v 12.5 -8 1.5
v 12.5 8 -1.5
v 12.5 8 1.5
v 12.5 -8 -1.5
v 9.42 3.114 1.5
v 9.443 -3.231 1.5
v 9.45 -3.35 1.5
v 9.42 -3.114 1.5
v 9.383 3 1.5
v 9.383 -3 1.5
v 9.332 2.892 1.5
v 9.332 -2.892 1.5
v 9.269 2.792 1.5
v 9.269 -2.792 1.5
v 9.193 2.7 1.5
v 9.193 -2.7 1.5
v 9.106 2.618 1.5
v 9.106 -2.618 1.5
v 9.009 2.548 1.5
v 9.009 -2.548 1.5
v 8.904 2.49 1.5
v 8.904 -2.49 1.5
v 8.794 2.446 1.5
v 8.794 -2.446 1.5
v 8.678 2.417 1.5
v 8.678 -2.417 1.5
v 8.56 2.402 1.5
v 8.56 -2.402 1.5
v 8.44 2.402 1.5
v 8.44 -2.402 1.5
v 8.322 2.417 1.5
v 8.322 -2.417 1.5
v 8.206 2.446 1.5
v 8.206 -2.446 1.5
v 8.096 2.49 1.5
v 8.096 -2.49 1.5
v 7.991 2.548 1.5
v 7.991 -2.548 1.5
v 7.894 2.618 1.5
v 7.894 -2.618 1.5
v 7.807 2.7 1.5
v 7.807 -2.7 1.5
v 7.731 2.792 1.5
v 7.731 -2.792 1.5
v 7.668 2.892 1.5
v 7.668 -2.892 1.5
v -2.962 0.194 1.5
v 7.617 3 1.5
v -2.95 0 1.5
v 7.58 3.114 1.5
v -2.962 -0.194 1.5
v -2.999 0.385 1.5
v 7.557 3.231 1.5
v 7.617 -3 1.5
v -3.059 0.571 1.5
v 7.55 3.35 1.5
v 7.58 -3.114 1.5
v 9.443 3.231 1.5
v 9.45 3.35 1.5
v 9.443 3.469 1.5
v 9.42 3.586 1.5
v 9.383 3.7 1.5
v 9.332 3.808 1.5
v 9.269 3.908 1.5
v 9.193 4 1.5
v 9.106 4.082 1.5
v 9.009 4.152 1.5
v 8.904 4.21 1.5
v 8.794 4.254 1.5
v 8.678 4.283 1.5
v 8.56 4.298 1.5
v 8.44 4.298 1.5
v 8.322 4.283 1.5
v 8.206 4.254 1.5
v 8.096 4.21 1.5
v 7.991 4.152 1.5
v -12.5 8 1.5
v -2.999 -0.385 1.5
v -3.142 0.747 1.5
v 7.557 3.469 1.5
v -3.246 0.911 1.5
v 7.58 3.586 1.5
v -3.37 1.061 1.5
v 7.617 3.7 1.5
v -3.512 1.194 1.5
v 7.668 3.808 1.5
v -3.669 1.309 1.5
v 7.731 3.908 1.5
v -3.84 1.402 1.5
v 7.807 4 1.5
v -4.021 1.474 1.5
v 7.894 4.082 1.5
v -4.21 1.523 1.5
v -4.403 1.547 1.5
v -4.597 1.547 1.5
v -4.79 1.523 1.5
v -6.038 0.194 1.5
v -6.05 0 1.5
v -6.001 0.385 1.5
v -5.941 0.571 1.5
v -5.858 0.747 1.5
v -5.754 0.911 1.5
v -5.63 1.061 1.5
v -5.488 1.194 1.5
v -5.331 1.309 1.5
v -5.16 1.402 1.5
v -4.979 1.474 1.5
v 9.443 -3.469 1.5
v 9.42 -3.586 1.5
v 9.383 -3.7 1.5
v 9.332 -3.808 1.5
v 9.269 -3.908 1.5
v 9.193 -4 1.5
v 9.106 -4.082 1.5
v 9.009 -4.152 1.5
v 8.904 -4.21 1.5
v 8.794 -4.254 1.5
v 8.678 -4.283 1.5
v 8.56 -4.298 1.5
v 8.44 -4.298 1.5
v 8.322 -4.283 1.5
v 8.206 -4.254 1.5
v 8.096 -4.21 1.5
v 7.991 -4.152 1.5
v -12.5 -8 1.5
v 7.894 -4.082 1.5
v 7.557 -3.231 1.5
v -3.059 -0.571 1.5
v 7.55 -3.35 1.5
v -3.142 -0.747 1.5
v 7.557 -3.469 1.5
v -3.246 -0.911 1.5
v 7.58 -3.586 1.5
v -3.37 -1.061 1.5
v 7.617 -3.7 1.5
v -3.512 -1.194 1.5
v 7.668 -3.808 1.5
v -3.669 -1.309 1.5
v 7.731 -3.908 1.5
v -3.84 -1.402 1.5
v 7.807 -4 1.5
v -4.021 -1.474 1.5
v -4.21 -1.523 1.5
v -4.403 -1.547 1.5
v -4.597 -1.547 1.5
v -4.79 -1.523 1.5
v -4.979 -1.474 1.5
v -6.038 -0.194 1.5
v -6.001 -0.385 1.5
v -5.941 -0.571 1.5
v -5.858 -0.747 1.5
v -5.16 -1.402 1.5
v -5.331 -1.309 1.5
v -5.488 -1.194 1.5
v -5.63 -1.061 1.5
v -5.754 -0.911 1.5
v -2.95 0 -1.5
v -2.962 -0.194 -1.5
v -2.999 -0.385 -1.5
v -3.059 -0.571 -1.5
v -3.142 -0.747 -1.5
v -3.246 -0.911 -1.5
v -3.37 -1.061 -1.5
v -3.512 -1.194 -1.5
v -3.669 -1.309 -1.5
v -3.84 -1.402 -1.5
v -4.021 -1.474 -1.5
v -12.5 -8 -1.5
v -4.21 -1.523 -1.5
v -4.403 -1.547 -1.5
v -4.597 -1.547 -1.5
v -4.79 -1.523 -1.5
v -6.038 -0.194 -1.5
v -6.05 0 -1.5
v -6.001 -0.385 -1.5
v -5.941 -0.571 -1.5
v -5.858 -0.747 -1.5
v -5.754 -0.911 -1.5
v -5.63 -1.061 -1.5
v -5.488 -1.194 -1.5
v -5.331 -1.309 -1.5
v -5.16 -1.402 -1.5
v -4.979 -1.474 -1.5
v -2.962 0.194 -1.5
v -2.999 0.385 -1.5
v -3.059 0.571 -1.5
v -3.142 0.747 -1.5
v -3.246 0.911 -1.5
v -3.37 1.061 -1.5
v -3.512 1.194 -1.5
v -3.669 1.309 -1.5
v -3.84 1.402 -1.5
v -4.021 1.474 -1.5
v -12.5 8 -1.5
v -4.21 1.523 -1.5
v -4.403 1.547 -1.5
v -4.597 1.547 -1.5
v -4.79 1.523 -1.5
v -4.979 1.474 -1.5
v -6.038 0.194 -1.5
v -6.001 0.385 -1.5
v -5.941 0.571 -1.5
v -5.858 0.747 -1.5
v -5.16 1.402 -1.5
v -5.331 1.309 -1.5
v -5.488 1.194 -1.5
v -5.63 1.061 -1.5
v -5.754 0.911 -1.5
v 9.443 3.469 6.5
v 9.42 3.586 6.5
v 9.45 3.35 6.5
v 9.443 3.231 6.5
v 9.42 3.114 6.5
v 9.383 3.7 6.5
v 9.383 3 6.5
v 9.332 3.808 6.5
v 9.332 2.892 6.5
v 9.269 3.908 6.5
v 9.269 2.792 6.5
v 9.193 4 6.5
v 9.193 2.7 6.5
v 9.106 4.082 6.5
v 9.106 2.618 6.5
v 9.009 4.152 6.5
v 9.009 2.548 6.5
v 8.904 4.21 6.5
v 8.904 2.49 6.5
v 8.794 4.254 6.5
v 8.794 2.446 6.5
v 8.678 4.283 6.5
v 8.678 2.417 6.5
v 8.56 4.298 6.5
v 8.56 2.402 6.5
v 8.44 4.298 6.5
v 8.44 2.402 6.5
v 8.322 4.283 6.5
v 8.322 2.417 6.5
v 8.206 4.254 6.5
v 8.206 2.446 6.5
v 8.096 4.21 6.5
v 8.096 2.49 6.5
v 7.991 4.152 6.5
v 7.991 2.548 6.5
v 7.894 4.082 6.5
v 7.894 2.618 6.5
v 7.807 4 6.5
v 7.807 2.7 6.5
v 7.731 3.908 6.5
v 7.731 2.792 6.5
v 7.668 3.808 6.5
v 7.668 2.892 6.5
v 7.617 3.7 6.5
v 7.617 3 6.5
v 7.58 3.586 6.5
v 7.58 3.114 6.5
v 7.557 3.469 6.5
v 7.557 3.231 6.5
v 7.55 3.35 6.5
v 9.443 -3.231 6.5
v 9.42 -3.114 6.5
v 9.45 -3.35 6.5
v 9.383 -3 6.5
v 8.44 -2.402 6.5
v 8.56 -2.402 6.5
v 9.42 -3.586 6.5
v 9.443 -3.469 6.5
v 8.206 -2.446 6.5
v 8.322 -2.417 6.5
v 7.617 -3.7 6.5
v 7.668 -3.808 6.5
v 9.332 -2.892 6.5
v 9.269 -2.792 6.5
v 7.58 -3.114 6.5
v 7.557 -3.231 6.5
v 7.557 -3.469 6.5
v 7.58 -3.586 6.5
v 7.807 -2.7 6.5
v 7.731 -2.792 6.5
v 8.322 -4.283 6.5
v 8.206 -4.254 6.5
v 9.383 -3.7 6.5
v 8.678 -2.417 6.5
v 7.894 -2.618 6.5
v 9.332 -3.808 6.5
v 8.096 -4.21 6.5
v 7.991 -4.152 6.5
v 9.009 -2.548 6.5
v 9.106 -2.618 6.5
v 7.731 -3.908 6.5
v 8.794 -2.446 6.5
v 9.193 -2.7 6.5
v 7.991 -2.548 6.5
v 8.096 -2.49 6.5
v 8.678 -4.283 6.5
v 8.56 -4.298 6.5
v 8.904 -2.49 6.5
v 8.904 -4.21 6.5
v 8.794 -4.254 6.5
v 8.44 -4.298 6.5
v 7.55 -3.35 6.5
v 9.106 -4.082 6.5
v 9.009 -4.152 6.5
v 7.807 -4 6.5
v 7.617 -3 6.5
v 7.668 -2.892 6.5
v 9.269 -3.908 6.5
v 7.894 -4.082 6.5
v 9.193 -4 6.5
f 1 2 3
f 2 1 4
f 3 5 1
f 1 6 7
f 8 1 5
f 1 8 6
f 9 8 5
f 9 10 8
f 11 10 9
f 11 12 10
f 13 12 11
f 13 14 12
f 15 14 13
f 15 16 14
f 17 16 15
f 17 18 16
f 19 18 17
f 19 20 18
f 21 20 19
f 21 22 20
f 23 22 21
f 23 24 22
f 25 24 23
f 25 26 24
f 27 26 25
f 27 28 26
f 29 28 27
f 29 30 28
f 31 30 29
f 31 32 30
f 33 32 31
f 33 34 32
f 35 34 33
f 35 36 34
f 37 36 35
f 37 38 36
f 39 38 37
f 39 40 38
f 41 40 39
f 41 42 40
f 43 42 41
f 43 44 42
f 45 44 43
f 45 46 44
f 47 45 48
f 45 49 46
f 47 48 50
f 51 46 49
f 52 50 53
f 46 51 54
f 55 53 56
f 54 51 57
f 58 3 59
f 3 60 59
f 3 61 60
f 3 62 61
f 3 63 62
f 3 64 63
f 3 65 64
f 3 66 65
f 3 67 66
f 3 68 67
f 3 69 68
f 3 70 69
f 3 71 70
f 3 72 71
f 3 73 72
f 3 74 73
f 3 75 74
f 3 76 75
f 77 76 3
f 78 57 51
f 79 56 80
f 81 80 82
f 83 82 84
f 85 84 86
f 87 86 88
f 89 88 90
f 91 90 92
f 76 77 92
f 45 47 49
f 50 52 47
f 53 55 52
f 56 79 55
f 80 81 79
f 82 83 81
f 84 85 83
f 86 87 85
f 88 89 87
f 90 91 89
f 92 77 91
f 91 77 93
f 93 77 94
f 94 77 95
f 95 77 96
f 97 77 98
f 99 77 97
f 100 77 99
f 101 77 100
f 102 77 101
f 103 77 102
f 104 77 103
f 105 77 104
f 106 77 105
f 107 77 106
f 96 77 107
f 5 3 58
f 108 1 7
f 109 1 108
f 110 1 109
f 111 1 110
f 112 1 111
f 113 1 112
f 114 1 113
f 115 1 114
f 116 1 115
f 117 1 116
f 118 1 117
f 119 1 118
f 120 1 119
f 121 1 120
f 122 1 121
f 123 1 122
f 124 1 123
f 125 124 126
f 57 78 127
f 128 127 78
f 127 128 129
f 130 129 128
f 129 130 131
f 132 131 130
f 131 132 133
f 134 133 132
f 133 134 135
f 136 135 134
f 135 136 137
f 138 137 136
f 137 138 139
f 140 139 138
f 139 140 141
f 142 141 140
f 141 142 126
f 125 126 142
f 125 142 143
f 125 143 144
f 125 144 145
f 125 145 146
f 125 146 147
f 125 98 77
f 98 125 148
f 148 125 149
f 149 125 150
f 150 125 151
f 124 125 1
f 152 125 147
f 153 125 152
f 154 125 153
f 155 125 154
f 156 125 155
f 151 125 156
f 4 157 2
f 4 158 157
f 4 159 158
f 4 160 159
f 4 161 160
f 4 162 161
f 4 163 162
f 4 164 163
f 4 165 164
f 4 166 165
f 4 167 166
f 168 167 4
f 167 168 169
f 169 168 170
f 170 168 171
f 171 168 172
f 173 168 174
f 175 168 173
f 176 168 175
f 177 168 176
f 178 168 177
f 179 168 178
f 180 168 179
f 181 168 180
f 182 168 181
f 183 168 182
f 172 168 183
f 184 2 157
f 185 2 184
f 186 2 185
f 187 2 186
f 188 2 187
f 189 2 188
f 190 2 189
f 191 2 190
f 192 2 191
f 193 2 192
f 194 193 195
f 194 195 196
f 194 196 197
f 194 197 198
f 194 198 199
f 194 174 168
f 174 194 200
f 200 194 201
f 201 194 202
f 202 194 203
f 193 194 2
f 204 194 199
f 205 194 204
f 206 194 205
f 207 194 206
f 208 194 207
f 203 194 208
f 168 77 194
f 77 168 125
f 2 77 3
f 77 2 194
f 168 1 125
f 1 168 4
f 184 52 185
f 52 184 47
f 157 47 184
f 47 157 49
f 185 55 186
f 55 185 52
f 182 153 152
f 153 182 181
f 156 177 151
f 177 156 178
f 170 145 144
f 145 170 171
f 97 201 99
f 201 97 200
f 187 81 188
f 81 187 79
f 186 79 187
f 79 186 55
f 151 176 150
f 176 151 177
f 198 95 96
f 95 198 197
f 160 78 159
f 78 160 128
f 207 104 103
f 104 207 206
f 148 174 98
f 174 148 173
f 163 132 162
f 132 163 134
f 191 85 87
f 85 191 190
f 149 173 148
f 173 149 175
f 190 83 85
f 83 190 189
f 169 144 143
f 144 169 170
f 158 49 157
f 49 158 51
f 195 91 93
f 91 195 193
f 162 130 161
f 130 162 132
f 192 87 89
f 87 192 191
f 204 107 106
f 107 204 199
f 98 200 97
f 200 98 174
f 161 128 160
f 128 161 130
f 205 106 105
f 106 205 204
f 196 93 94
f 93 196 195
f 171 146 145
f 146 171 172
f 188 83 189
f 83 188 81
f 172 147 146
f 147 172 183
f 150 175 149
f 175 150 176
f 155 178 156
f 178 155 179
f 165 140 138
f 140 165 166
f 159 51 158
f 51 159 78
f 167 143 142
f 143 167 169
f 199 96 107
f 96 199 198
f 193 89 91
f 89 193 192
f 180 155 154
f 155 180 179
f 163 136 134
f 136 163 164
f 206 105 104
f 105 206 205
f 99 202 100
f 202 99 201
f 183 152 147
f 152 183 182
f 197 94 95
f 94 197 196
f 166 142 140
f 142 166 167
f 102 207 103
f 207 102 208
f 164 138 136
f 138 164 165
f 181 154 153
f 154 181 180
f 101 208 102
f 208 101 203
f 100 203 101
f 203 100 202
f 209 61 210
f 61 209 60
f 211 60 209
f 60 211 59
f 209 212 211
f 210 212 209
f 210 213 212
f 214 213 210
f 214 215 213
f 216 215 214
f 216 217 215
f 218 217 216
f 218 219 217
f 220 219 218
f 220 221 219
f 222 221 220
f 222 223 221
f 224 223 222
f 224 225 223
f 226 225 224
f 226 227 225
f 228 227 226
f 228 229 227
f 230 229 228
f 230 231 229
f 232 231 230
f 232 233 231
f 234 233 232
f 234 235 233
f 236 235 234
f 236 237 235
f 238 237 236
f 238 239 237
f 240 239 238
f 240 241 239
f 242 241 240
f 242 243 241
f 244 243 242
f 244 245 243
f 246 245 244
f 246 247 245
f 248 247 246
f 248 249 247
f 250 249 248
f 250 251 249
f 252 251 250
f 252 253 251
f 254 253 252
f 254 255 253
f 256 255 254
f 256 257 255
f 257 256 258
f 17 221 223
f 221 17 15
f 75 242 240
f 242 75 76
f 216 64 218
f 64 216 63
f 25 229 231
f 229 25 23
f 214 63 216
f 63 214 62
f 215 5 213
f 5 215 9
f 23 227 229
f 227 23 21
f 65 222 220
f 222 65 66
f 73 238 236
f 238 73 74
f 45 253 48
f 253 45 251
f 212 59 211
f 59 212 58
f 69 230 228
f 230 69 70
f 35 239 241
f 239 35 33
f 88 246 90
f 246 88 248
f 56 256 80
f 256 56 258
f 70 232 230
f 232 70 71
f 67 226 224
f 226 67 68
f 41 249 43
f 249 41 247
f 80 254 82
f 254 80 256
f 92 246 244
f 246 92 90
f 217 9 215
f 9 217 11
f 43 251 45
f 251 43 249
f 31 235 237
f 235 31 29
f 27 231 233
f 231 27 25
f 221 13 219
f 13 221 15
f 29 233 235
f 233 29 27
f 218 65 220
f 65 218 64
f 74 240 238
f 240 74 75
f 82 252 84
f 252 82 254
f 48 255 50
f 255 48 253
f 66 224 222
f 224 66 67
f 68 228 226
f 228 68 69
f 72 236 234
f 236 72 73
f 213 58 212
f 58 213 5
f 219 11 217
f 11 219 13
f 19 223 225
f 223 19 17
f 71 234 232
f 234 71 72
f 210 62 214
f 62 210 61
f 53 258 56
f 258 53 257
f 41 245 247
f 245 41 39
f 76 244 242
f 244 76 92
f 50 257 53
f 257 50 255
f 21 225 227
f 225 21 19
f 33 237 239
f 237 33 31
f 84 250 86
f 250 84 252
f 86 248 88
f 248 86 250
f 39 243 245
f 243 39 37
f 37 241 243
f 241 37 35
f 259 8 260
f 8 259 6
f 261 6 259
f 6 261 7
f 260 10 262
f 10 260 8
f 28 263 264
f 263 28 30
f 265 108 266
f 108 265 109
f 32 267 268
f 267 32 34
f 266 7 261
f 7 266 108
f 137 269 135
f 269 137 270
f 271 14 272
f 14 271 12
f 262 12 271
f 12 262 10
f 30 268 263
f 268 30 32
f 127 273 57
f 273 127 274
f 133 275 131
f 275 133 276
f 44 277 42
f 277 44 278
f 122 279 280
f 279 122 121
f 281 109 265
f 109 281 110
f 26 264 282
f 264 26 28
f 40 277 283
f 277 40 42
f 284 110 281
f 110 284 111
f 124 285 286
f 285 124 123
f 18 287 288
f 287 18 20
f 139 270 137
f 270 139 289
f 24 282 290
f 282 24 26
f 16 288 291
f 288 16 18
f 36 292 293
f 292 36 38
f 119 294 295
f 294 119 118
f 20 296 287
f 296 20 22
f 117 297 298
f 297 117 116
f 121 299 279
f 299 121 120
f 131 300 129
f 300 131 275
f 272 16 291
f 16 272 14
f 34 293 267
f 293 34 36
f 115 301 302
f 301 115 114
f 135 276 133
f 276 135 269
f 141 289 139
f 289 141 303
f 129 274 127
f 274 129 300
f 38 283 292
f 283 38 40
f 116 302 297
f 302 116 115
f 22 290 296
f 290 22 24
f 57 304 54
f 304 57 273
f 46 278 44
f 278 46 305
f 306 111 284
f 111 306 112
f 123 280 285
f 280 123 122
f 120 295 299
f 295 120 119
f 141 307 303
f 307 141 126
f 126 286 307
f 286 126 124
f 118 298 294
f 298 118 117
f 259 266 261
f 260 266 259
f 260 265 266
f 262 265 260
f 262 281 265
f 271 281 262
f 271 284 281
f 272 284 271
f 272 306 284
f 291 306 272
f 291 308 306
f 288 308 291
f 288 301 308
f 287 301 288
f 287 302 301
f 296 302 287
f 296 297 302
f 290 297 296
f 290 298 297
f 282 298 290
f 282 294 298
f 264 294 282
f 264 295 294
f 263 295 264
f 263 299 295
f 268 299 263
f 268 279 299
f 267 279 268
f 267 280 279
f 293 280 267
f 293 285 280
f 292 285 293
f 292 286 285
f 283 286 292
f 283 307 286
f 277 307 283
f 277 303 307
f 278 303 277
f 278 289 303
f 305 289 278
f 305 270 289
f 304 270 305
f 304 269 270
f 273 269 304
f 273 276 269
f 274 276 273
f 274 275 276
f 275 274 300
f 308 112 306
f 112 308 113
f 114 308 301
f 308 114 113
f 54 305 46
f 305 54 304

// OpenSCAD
x = 15;
y = 15;
h = 3;
dTrou = 1.9;
dxTrou = 8.6;

//attacheHoriz(15,15,3,1.9);

//translate([0,2*y,0]) 
attacheVert(25,16,3,1.9);

module attacheVert(x,y,z,dTrou) {
union() {
    difference() {
        cube([x,y,h], true);
        #translate([-0.5*x+8,0,0]) cylinder(h=h*2,d=3.1, $fn=50, center=true);
        
    }
    translate([x*0.5-4,0.5*(dxTrou-dTrou),h/2])
    cylinder(h=5,d=dTrou, $fn=50);
    translate([x*0.5-4,-0.5*(dxTrou-dTrou),h/2]) 
    cylinder(h=5, d=dTrou, $fn=50);
}
}

module attacheHoriz(x,y,z,dTrou) {
union() {
    difference() {
        cube([x,y,h], true);
        #cylinder(h=h*2,d=3.1, $fn=50, center=true);
        
    }
    translate([x*0.5,0.5*(dxTrou-dTrou),(dTrou-h)/2]) rotate([0,90,0])
    cylinder(h=5,d=dTrou, $fn=50);
    translate([x*0.5,-0.5*(dxTrou-dTrou),(dTrou-h)/2]) rotate([0,90,0])
    cylinder(h=5, d=dTrou, $fn=50);
}
}
